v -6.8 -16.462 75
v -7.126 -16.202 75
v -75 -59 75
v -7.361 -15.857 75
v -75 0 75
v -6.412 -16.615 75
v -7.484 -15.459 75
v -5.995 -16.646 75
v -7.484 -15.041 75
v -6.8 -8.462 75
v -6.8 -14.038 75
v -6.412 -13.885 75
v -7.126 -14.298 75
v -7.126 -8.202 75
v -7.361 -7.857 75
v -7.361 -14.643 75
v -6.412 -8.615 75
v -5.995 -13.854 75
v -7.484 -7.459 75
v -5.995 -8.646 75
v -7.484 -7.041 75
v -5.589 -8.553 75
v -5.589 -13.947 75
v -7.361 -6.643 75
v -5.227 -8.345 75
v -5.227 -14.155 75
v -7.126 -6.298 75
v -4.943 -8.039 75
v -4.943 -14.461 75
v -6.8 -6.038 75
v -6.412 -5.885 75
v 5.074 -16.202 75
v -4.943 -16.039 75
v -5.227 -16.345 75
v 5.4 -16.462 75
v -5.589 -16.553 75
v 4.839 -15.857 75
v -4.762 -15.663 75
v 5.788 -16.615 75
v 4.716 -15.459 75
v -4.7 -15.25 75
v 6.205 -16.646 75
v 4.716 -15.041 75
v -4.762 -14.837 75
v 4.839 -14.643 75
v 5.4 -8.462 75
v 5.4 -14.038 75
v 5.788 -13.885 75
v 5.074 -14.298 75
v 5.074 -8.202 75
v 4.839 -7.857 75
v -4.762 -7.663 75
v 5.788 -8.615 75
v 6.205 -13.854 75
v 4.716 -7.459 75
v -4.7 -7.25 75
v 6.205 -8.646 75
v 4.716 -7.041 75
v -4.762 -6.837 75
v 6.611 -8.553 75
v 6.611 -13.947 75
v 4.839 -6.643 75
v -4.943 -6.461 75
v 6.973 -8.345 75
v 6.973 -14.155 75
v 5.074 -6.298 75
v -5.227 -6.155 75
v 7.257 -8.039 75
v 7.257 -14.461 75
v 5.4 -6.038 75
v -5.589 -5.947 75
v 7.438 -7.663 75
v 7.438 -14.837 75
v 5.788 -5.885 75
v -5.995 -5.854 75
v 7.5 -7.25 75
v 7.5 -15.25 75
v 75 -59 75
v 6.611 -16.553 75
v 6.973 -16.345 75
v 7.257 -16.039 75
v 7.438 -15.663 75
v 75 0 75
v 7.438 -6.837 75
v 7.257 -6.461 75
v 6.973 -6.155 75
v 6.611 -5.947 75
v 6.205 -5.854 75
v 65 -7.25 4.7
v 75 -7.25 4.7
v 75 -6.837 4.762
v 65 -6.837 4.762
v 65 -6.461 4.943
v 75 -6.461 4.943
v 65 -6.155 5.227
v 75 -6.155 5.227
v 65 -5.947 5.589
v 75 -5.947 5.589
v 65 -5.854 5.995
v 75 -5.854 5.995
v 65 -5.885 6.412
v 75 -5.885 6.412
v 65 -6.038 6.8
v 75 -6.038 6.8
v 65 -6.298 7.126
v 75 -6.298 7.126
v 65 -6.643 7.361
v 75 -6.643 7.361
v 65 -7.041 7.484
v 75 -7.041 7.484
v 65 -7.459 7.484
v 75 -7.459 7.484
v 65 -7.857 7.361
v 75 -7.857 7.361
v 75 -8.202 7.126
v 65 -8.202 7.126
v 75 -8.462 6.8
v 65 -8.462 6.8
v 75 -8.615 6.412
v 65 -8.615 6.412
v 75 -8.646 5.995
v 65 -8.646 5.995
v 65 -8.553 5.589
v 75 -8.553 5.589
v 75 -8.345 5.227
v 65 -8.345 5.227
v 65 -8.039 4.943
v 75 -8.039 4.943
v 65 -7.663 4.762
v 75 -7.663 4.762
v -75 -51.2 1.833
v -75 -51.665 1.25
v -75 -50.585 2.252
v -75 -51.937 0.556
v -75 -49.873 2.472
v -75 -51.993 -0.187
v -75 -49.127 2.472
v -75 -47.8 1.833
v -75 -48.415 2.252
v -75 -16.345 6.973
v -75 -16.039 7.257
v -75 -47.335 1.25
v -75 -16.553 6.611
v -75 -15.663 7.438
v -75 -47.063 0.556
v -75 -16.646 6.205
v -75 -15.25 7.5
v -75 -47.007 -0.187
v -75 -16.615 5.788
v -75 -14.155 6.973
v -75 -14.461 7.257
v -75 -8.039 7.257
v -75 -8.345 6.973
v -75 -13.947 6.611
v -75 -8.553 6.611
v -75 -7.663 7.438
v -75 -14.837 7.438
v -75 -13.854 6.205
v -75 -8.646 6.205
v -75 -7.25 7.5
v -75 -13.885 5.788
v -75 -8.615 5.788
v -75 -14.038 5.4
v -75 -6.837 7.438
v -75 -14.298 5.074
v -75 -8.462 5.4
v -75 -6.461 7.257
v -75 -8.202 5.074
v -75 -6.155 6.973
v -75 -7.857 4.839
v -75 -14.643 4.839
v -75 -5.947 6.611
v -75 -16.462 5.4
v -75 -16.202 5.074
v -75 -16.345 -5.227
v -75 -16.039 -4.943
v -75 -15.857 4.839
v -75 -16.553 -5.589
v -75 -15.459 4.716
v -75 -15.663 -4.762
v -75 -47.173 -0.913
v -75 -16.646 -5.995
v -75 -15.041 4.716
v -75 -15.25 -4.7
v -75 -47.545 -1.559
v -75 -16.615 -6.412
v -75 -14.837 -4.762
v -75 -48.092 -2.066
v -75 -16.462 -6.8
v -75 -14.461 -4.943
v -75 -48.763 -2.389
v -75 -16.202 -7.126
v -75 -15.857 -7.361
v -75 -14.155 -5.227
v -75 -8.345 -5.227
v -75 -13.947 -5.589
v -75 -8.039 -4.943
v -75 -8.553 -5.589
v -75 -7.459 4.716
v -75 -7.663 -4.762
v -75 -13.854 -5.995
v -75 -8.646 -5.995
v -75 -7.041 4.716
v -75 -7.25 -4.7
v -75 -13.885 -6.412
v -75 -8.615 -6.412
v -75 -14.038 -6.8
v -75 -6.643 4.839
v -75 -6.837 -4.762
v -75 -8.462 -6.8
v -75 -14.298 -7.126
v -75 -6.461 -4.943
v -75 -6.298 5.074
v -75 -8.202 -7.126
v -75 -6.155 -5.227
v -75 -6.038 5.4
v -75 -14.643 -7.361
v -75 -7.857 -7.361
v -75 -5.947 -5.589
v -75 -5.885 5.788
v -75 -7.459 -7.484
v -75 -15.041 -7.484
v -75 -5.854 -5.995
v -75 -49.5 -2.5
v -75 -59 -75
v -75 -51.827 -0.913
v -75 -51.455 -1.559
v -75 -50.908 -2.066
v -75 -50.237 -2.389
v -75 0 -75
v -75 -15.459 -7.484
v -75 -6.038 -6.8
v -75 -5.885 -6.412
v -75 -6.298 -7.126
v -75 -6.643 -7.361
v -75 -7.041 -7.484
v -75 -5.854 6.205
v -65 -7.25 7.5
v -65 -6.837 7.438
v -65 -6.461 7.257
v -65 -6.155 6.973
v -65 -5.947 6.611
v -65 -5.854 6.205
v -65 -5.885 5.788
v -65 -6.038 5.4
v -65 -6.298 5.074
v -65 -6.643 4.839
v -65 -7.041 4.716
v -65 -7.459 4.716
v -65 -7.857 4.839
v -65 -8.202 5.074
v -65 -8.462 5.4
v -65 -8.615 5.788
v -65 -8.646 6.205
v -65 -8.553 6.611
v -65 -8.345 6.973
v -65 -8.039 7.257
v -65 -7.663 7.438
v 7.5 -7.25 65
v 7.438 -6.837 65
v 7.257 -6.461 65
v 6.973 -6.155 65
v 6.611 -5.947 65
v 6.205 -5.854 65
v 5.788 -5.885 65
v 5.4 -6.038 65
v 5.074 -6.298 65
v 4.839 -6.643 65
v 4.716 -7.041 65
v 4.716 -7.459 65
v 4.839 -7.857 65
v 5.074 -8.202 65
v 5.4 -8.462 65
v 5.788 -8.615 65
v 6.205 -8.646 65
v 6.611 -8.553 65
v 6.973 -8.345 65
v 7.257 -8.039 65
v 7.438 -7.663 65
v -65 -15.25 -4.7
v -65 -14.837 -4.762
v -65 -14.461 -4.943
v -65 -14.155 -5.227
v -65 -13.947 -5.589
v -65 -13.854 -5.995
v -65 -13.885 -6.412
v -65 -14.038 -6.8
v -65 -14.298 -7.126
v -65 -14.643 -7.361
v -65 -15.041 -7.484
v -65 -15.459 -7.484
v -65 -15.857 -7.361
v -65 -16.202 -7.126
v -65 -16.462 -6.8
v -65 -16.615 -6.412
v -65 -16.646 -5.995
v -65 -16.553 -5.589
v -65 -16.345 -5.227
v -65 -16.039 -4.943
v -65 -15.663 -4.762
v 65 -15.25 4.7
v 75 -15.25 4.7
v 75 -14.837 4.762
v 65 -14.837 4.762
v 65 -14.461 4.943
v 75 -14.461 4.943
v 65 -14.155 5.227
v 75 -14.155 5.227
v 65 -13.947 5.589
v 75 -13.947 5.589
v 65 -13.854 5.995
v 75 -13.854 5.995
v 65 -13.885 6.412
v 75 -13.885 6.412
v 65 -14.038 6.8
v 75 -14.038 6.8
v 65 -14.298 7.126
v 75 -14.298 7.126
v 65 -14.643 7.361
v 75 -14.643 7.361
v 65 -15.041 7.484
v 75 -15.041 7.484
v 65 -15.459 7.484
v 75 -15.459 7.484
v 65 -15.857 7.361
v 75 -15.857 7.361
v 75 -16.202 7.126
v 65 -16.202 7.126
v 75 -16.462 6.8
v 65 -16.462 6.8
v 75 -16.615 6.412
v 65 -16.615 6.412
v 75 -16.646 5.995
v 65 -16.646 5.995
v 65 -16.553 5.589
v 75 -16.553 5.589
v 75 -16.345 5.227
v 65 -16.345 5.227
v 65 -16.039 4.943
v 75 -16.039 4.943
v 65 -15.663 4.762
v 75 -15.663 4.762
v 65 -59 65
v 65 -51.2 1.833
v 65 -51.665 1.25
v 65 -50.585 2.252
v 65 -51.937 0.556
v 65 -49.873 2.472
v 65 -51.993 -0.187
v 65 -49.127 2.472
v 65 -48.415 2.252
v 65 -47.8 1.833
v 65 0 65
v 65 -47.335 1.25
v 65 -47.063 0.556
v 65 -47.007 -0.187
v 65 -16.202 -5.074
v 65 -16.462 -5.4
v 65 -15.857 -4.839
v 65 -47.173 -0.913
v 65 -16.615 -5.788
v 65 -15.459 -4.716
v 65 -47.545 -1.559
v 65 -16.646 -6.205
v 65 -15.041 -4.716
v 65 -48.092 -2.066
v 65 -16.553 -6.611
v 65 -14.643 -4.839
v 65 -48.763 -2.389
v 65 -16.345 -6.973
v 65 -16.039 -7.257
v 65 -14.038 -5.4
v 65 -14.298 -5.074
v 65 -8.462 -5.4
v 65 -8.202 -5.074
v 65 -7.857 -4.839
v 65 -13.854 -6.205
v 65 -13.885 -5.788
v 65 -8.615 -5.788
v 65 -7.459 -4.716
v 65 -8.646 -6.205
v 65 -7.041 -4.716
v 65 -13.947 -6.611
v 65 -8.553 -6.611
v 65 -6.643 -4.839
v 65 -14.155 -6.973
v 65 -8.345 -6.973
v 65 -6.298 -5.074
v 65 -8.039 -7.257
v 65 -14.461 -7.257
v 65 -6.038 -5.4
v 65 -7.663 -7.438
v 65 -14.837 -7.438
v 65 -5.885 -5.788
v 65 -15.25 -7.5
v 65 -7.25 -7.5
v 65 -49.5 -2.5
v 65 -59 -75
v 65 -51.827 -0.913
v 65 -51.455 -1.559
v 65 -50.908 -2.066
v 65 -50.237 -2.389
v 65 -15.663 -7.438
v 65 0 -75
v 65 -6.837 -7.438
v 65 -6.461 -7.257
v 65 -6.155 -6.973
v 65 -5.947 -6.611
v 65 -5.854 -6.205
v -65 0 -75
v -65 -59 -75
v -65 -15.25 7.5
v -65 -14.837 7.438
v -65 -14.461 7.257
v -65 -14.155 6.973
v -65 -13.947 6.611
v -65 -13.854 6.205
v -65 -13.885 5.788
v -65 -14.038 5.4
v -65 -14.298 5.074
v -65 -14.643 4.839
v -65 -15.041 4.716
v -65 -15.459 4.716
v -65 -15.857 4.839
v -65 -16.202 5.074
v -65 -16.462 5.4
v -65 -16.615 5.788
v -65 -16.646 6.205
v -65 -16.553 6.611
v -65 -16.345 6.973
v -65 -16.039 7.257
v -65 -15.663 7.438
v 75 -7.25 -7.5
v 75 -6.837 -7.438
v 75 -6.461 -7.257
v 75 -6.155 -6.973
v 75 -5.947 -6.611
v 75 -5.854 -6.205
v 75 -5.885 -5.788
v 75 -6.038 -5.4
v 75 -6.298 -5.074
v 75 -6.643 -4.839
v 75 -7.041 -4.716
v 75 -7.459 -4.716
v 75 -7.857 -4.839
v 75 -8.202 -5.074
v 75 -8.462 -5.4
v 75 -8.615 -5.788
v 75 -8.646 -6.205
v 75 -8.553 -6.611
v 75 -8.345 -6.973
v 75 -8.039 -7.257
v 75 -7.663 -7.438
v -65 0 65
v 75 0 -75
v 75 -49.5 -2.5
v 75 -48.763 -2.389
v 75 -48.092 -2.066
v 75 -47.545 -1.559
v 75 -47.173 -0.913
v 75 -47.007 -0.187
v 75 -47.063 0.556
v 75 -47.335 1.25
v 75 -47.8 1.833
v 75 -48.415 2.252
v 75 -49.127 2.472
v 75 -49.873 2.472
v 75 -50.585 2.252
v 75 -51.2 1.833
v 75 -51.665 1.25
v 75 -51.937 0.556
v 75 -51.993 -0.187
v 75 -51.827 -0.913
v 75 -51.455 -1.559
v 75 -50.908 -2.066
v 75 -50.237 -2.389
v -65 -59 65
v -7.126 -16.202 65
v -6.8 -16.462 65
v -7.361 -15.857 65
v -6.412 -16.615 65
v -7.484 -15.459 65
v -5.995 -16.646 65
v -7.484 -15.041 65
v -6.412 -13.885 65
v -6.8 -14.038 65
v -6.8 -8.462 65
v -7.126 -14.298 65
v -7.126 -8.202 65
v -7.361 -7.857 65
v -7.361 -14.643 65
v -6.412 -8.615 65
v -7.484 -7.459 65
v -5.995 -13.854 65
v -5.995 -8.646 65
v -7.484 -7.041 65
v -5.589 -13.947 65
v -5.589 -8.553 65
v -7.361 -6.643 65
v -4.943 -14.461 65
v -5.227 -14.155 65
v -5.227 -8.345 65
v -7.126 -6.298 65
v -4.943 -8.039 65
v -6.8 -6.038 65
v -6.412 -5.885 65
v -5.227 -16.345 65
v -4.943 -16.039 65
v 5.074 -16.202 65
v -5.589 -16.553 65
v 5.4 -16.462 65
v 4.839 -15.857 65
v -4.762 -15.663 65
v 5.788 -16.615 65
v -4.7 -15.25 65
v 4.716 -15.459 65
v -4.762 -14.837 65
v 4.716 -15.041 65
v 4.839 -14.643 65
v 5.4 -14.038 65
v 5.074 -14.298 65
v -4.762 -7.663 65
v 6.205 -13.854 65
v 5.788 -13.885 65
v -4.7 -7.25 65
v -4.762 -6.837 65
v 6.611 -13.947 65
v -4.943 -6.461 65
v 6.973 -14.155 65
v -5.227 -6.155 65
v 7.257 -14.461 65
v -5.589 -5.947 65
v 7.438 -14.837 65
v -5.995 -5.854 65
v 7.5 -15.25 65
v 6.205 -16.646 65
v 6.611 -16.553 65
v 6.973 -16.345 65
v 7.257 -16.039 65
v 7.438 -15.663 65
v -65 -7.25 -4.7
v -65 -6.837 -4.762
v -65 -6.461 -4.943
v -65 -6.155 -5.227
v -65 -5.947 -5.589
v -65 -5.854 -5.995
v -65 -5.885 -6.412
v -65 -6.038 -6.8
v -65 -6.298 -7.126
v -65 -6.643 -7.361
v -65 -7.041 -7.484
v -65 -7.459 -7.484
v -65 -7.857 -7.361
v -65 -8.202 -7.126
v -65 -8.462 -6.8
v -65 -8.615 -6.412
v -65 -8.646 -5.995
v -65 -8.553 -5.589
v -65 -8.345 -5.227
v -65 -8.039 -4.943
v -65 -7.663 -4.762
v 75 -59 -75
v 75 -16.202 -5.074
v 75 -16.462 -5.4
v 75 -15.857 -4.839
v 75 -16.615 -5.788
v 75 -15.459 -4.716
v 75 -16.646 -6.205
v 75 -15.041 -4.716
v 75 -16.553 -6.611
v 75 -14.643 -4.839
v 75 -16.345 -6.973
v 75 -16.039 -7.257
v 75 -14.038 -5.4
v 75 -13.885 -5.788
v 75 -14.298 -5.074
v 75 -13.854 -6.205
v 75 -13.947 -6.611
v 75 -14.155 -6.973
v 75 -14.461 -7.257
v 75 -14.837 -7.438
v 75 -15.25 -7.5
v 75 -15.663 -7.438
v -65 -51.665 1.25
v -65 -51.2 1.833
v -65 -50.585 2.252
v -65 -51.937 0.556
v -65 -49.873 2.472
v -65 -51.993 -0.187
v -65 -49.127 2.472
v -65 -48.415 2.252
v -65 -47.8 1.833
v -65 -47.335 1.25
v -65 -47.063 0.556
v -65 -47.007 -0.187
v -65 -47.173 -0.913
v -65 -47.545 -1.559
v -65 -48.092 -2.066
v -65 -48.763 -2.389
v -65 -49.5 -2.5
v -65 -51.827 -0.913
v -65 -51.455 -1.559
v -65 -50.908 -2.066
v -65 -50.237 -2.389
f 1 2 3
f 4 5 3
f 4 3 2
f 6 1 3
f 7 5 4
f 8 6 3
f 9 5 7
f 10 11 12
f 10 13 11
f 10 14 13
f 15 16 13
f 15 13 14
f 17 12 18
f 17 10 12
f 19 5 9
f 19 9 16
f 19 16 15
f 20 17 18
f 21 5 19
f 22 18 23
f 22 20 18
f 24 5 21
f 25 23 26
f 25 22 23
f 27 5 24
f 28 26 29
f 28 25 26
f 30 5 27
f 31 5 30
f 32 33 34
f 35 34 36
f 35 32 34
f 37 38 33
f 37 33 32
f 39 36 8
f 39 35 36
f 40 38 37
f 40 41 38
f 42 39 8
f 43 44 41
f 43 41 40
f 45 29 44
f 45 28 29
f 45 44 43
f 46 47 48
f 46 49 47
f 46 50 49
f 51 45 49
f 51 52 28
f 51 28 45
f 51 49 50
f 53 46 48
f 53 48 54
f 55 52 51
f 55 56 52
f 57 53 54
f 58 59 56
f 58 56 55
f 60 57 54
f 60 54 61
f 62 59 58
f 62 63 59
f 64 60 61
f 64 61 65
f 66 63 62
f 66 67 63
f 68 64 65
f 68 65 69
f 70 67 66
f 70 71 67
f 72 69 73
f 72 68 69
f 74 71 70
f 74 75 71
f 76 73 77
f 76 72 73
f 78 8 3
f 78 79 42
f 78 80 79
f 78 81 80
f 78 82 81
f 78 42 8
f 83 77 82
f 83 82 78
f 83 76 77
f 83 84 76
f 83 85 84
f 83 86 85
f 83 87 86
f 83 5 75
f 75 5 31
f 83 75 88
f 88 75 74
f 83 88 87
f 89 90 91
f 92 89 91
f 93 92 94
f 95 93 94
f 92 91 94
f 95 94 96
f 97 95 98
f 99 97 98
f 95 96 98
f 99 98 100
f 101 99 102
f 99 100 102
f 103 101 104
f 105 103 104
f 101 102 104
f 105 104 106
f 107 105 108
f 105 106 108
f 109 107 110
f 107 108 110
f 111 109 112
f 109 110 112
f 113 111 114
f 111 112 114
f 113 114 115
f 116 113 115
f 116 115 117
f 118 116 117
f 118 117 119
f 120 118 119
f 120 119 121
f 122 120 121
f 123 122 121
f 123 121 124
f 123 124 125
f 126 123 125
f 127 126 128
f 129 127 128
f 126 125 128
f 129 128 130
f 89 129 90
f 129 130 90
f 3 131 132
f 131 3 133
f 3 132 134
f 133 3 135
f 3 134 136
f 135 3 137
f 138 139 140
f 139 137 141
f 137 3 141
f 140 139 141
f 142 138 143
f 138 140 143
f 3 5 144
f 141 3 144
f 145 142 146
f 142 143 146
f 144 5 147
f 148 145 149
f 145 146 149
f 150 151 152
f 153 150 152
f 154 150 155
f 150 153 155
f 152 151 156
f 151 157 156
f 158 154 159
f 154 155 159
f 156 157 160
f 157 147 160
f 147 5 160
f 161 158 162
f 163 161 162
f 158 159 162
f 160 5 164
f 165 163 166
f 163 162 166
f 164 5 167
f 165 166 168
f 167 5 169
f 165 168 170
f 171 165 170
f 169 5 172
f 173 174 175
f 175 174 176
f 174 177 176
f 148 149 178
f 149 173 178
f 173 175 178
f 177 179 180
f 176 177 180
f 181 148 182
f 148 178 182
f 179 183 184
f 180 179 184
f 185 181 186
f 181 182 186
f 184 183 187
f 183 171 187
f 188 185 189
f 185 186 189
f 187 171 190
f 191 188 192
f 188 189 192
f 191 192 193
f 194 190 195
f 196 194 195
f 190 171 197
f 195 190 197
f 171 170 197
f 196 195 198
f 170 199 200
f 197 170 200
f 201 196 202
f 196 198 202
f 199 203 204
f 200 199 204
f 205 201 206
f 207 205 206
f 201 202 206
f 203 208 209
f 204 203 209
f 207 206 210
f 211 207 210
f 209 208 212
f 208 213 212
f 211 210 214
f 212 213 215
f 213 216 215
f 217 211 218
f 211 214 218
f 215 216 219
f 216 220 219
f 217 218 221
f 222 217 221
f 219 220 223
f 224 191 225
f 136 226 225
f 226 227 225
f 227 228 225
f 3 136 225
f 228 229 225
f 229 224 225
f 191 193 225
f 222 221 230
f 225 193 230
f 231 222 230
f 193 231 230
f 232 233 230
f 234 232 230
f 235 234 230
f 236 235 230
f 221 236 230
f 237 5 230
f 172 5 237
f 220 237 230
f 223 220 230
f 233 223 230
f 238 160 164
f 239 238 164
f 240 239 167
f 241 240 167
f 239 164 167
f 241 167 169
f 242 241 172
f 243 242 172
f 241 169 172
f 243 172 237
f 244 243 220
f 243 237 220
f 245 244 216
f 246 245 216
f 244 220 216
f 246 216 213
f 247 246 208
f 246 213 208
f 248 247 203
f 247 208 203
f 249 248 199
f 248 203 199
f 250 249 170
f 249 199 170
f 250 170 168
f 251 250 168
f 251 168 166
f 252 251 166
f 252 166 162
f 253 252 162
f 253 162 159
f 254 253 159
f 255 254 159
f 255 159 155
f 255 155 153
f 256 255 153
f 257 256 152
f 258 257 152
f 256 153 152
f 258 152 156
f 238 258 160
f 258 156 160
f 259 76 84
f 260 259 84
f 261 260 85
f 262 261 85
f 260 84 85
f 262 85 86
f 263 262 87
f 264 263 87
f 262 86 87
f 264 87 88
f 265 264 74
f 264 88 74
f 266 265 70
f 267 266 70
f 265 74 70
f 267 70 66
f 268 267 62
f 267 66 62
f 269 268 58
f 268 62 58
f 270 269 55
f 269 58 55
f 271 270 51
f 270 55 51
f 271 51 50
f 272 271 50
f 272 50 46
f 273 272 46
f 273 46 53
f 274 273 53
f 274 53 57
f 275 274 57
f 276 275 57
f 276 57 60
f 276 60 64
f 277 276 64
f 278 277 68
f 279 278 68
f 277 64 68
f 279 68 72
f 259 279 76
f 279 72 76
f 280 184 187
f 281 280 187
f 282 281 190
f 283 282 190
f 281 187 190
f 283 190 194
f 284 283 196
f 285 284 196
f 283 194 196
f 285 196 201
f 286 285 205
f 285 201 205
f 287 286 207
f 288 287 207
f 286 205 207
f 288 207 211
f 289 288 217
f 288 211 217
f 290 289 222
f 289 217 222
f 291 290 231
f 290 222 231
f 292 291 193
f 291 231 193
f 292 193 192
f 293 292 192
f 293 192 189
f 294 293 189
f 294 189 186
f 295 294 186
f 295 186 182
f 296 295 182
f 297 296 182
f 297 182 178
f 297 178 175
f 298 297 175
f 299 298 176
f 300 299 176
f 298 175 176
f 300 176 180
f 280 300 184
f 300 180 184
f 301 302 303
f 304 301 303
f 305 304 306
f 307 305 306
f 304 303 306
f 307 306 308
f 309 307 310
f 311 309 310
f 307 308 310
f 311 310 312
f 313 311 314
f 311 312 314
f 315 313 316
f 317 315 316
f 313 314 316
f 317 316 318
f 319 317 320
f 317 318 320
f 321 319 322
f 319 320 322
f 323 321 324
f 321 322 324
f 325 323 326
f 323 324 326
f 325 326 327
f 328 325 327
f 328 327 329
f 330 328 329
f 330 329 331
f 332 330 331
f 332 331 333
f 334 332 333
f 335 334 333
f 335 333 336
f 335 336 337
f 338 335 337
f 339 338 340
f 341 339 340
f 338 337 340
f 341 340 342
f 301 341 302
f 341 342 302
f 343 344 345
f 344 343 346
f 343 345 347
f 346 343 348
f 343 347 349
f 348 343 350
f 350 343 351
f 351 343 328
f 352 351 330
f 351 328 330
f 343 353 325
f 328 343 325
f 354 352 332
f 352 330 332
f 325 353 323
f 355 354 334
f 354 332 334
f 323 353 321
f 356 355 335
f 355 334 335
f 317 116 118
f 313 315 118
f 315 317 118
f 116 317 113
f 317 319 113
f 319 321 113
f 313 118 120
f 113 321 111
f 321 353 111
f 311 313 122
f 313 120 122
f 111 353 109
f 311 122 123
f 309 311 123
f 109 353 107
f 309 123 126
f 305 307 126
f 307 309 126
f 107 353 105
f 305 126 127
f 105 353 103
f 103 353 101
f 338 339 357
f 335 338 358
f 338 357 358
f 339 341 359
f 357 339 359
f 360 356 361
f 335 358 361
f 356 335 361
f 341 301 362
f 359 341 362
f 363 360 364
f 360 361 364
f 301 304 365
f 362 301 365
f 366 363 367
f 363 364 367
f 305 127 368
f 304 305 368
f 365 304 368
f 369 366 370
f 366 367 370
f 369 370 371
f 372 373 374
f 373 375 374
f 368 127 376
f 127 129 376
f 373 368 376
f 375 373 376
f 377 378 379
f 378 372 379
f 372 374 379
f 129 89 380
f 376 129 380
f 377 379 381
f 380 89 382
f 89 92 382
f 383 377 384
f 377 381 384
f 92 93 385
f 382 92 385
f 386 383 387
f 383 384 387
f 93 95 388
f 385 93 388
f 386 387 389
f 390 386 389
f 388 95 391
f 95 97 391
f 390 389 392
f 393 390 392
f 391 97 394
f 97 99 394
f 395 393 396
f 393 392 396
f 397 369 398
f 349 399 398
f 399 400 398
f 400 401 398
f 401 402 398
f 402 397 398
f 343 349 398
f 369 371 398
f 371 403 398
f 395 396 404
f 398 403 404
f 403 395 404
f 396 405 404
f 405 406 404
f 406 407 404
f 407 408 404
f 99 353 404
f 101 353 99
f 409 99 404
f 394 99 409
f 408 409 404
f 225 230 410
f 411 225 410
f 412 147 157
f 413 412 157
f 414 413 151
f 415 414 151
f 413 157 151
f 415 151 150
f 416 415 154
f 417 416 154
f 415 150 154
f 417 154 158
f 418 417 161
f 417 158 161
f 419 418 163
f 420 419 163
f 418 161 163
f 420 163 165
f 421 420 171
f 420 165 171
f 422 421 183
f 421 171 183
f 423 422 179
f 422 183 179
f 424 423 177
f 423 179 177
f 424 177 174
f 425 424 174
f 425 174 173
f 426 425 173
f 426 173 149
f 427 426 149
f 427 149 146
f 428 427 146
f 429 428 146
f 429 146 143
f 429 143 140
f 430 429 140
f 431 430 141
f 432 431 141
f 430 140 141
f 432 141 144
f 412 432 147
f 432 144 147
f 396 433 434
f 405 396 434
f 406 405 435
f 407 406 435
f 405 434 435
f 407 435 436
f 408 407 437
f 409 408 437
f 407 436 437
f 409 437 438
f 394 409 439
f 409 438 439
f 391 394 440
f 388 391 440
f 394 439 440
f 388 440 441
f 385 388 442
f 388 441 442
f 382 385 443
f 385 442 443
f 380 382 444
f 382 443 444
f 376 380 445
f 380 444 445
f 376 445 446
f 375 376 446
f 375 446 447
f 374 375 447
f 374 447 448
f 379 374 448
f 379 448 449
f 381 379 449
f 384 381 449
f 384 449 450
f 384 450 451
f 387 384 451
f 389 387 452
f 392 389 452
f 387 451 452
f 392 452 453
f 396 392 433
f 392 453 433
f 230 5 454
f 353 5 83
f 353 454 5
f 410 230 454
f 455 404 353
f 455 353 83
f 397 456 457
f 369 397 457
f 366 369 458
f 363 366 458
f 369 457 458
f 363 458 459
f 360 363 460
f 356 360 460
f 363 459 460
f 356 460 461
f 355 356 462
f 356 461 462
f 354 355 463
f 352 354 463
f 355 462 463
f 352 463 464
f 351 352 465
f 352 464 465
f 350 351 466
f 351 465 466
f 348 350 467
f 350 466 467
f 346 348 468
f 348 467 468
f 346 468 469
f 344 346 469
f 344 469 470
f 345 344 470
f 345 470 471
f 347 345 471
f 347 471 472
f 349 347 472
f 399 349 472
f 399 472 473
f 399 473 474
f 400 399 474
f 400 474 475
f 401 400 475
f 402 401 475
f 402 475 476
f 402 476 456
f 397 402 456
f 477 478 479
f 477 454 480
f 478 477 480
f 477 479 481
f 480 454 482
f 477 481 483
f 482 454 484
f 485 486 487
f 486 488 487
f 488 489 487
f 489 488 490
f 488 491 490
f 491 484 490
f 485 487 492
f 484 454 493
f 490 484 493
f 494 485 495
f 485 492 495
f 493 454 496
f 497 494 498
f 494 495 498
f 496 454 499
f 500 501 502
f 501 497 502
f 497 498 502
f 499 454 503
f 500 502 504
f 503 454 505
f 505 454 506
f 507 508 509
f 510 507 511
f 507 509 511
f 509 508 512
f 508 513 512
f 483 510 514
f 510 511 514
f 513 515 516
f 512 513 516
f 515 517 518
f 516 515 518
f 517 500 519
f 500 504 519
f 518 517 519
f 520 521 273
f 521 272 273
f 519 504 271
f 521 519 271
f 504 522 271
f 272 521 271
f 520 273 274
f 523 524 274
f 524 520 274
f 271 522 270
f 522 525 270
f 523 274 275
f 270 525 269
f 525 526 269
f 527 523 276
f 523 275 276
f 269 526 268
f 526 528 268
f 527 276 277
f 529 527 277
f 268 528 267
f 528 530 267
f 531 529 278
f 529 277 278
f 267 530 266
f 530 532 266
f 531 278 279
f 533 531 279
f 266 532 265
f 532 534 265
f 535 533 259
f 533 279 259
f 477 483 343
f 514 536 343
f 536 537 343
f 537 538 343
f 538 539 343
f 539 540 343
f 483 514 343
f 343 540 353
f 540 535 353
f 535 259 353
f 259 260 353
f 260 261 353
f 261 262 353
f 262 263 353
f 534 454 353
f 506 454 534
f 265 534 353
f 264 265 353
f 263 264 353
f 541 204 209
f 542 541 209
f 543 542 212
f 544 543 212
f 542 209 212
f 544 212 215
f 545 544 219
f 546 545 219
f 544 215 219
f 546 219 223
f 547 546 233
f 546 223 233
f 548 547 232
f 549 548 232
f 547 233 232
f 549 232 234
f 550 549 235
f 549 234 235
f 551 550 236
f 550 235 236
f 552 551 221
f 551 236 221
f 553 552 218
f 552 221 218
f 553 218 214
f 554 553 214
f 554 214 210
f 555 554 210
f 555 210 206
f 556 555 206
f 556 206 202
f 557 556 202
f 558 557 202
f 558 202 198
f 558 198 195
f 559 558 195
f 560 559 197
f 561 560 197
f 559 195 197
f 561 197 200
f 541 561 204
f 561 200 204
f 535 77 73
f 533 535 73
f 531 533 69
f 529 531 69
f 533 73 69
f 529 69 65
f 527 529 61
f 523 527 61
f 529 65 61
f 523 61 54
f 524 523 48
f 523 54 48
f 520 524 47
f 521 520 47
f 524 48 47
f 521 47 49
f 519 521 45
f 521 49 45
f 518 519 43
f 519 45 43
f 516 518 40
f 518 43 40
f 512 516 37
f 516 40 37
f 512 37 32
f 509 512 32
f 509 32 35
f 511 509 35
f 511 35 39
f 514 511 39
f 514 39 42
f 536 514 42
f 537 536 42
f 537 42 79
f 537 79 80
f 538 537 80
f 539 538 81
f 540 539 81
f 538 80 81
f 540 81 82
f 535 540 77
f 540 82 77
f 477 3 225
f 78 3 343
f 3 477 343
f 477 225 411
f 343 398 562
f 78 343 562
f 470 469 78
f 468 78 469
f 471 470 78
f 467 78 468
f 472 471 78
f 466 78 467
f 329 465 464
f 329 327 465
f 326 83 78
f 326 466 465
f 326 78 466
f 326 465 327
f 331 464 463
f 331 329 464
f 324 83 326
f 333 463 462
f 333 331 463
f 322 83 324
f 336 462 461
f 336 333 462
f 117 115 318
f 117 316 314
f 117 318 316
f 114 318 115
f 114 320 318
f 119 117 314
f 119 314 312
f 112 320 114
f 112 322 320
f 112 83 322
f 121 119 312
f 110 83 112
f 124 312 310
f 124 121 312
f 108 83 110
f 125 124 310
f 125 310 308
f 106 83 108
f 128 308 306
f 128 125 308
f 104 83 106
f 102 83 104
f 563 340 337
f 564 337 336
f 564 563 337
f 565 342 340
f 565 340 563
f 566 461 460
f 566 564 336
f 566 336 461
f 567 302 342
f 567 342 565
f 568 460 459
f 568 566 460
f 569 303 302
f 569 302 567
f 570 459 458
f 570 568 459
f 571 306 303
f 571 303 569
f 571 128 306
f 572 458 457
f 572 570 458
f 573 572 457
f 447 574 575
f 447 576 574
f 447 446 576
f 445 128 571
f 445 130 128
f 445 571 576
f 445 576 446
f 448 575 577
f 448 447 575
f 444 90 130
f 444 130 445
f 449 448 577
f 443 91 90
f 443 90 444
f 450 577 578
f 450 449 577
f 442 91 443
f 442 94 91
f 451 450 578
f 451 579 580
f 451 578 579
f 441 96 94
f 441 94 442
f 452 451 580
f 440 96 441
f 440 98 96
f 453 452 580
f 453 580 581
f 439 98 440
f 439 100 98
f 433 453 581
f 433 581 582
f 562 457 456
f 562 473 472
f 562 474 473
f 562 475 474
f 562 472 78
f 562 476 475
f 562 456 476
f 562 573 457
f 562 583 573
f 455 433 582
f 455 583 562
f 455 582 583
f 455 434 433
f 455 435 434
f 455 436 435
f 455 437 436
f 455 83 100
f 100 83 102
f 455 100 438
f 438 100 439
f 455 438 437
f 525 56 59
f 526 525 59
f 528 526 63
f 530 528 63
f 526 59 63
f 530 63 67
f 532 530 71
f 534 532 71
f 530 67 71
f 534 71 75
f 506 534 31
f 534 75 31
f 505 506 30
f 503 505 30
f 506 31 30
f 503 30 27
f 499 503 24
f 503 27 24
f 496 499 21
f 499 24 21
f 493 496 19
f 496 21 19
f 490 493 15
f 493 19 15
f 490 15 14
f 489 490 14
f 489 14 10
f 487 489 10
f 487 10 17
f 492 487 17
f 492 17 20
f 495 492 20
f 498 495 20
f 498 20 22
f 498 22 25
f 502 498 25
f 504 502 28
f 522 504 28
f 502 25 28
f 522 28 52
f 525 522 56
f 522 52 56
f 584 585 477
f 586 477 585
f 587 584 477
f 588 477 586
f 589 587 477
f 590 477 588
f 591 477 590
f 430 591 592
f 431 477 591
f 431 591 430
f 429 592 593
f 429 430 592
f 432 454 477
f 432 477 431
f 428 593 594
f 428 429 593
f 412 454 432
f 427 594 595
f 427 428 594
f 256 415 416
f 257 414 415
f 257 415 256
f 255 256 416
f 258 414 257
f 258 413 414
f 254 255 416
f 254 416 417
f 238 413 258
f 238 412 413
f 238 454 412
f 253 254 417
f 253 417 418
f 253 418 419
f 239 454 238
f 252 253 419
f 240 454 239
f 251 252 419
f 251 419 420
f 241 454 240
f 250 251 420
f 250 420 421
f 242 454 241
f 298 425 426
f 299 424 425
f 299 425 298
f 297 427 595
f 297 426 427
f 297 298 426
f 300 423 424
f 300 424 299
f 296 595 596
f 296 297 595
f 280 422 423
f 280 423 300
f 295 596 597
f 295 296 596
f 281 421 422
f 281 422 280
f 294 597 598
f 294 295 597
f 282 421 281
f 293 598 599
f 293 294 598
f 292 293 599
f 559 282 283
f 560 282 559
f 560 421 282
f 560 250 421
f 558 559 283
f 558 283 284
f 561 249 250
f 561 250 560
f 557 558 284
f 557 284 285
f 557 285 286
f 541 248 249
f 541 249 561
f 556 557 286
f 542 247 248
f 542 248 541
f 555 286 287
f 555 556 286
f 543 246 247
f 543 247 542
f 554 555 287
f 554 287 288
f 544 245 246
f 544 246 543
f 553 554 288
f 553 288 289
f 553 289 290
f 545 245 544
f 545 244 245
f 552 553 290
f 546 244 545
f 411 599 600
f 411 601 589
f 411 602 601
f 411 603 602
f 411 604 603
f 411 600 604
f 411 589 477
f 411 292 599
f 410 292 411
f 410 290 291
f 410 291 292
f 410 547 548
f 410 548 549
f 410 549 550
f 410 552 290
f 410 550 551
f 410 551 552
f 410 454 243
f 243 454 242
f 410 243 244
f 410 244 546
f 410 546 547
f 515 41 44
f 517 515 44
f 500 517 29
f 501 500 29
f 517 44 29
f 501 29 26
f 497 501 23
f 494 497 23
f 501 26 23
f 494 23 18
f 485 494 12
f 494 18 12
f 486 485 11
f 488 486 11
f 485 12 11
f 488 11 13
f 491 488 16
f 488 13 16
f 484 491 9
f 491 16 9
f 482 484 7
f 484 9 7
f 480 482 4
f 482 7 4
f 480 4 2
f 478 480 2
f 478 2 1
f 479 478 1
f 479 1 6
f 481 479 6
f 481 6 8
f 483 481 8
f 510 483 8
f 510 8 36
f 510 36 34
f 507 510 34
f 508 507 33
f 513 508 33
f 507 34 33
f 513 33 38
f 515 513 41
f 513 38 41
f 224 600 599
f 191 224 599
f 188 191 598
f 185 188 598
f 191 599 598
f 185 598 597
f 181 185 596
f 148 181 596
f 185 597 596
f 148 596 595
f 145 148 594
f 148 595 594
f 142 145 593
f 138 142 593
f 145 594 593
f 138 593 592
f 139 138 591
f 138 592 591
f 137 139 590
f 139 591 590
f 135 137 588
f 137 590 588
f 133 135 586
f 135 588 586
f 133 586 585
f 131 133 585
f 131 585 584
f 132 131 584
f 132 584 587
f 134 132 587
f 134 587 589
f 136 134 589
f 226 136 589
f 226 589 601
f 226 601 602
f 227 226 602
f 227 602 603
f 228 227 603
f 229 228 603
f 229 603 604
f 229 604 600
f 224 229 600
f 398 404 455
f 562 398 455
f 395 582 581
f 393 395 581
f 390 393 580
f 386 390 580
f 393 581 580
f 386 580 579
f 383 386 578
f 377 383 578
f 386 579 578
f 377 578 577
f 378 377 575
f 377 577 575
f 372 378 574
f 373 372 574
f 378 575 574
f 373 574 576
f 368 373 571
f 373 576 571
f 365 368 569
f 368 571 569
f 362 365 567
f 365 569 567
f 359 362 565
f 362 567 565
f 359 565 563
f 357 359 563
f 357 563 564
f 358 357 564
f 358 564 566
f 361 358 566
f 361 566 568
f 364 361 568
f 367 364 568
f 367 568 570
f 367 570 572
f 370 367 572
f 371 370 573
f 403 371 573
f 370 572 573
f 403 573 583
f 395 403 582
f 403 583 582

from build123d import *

# Parameters (mm, degrees)
SKETCH1_W           = 150
SKETCH1_H           = 150
BOSS_EXTRUDE1_DEPTH = 59
SKETCH2_W           = 130
SKETCH2_H           = 130
CUT_EXTRUDE1_DEPTH  = 60
SKETCH9_R           = 1.4
CUT_EXTRUDE4_DEPTH  = 10
CIRPATTERN1_COUNT   = 3
CIRPATTERN1_ANGLE   = 180
SKETCH10_W          = 130
SKETCH10_H          = 96.398295943
CUT_EXTRUDE6_DEPTH  = 60
SKETCH11_R          = 2.5
CUT_EXTRUDE7_DEPTH  = 151


with BuildPart() as part:
    # Sketch1 → Boss-Extrude1 (new body)
    with BuildSketch(Plane(origin=(0, 0, 0), x_dir=(1, 0, 0), z_dir=(0, 1, 0))):
        Rectangle(SKETCH1_W, SKETCH1_H)
    extrude(amount=-BOSS_EXTRUDE1_DEPTH)

    # Sketch2 → Cut-Extrude1 (cut, through all)
    with BuildSketch(Plane(origin=(0, 0, 0), x_dir=(1, 0, 0), z_dir=(0, 1, 0))):
        Rectangle(SKETCH2_W, SKETCH2_H)
    extrude(amount=-CUT_EXTRUDE1_DEPTH, mode=Mode.SUBTRACT)

    # Sketch9 → Cut-Extrude4 (cut)
    with BuildSketch(Plane.ZY.offset(75)):
        with Locations((-6.1, -7.25)):
            Circle(SKETCH9_R)
        with Locations((6.1, -7.25)):
            Circle(SKETCH9_R)
        with Locations((6.1, -15.25)):
            Circle(SKETCH9_R)
        with Locations((-6.1, -15.25)):
            Circle(SKETCH9_R)
    cut_extrude4 = extrude(amount=-CUT_EXTRUDE4_DEPTH, mode=Mode.SUBTRACT)

    # CirPattern1: Cut-Extrude4 ×3 about axis
    cirpattern1_axis = Axis((0, 0, 0), (0, 1, 0))
    for i in range(1, CIRPATTERN1_COUNT):
        add(cut_extrude4.rotate(cirpattern1_axis, i * CIRPATTERN1_ANGLE / (CIRPATTERN1_COUNT - 1)), mode=Mode.SUBTRACT)

    # Sketch10 → Cut-Extrude6 (cut, through all)
    with BuildSketch(Plane(origin=(0, 0, 0), x_dir=(1, 0, 0), z_dir=(0, 1, 0))):
        with Locations((0, 113.199147972)):
            Rectangle(SKETCH10_W, SKETCH10_H)
    extrude(amount=-CUT_EXTRUDE6_DEPTH, mode=Mode.SUBTRACT)

    # Sketch11 → Cut-Extrude7 (cut, through all)
    with BuildSketch(Plane(origin=(75, 0, 0), x_dir=(0, 0, -1), z_dir=(1, 0, 0))):
        with Locations((0, -49.5)):
            Circle(SKETCH11_R)
    extrude(amount=-CUT_EXTRUDE7_DEPTH, mode=Mode.SUBTRACT)


solid = part.part
